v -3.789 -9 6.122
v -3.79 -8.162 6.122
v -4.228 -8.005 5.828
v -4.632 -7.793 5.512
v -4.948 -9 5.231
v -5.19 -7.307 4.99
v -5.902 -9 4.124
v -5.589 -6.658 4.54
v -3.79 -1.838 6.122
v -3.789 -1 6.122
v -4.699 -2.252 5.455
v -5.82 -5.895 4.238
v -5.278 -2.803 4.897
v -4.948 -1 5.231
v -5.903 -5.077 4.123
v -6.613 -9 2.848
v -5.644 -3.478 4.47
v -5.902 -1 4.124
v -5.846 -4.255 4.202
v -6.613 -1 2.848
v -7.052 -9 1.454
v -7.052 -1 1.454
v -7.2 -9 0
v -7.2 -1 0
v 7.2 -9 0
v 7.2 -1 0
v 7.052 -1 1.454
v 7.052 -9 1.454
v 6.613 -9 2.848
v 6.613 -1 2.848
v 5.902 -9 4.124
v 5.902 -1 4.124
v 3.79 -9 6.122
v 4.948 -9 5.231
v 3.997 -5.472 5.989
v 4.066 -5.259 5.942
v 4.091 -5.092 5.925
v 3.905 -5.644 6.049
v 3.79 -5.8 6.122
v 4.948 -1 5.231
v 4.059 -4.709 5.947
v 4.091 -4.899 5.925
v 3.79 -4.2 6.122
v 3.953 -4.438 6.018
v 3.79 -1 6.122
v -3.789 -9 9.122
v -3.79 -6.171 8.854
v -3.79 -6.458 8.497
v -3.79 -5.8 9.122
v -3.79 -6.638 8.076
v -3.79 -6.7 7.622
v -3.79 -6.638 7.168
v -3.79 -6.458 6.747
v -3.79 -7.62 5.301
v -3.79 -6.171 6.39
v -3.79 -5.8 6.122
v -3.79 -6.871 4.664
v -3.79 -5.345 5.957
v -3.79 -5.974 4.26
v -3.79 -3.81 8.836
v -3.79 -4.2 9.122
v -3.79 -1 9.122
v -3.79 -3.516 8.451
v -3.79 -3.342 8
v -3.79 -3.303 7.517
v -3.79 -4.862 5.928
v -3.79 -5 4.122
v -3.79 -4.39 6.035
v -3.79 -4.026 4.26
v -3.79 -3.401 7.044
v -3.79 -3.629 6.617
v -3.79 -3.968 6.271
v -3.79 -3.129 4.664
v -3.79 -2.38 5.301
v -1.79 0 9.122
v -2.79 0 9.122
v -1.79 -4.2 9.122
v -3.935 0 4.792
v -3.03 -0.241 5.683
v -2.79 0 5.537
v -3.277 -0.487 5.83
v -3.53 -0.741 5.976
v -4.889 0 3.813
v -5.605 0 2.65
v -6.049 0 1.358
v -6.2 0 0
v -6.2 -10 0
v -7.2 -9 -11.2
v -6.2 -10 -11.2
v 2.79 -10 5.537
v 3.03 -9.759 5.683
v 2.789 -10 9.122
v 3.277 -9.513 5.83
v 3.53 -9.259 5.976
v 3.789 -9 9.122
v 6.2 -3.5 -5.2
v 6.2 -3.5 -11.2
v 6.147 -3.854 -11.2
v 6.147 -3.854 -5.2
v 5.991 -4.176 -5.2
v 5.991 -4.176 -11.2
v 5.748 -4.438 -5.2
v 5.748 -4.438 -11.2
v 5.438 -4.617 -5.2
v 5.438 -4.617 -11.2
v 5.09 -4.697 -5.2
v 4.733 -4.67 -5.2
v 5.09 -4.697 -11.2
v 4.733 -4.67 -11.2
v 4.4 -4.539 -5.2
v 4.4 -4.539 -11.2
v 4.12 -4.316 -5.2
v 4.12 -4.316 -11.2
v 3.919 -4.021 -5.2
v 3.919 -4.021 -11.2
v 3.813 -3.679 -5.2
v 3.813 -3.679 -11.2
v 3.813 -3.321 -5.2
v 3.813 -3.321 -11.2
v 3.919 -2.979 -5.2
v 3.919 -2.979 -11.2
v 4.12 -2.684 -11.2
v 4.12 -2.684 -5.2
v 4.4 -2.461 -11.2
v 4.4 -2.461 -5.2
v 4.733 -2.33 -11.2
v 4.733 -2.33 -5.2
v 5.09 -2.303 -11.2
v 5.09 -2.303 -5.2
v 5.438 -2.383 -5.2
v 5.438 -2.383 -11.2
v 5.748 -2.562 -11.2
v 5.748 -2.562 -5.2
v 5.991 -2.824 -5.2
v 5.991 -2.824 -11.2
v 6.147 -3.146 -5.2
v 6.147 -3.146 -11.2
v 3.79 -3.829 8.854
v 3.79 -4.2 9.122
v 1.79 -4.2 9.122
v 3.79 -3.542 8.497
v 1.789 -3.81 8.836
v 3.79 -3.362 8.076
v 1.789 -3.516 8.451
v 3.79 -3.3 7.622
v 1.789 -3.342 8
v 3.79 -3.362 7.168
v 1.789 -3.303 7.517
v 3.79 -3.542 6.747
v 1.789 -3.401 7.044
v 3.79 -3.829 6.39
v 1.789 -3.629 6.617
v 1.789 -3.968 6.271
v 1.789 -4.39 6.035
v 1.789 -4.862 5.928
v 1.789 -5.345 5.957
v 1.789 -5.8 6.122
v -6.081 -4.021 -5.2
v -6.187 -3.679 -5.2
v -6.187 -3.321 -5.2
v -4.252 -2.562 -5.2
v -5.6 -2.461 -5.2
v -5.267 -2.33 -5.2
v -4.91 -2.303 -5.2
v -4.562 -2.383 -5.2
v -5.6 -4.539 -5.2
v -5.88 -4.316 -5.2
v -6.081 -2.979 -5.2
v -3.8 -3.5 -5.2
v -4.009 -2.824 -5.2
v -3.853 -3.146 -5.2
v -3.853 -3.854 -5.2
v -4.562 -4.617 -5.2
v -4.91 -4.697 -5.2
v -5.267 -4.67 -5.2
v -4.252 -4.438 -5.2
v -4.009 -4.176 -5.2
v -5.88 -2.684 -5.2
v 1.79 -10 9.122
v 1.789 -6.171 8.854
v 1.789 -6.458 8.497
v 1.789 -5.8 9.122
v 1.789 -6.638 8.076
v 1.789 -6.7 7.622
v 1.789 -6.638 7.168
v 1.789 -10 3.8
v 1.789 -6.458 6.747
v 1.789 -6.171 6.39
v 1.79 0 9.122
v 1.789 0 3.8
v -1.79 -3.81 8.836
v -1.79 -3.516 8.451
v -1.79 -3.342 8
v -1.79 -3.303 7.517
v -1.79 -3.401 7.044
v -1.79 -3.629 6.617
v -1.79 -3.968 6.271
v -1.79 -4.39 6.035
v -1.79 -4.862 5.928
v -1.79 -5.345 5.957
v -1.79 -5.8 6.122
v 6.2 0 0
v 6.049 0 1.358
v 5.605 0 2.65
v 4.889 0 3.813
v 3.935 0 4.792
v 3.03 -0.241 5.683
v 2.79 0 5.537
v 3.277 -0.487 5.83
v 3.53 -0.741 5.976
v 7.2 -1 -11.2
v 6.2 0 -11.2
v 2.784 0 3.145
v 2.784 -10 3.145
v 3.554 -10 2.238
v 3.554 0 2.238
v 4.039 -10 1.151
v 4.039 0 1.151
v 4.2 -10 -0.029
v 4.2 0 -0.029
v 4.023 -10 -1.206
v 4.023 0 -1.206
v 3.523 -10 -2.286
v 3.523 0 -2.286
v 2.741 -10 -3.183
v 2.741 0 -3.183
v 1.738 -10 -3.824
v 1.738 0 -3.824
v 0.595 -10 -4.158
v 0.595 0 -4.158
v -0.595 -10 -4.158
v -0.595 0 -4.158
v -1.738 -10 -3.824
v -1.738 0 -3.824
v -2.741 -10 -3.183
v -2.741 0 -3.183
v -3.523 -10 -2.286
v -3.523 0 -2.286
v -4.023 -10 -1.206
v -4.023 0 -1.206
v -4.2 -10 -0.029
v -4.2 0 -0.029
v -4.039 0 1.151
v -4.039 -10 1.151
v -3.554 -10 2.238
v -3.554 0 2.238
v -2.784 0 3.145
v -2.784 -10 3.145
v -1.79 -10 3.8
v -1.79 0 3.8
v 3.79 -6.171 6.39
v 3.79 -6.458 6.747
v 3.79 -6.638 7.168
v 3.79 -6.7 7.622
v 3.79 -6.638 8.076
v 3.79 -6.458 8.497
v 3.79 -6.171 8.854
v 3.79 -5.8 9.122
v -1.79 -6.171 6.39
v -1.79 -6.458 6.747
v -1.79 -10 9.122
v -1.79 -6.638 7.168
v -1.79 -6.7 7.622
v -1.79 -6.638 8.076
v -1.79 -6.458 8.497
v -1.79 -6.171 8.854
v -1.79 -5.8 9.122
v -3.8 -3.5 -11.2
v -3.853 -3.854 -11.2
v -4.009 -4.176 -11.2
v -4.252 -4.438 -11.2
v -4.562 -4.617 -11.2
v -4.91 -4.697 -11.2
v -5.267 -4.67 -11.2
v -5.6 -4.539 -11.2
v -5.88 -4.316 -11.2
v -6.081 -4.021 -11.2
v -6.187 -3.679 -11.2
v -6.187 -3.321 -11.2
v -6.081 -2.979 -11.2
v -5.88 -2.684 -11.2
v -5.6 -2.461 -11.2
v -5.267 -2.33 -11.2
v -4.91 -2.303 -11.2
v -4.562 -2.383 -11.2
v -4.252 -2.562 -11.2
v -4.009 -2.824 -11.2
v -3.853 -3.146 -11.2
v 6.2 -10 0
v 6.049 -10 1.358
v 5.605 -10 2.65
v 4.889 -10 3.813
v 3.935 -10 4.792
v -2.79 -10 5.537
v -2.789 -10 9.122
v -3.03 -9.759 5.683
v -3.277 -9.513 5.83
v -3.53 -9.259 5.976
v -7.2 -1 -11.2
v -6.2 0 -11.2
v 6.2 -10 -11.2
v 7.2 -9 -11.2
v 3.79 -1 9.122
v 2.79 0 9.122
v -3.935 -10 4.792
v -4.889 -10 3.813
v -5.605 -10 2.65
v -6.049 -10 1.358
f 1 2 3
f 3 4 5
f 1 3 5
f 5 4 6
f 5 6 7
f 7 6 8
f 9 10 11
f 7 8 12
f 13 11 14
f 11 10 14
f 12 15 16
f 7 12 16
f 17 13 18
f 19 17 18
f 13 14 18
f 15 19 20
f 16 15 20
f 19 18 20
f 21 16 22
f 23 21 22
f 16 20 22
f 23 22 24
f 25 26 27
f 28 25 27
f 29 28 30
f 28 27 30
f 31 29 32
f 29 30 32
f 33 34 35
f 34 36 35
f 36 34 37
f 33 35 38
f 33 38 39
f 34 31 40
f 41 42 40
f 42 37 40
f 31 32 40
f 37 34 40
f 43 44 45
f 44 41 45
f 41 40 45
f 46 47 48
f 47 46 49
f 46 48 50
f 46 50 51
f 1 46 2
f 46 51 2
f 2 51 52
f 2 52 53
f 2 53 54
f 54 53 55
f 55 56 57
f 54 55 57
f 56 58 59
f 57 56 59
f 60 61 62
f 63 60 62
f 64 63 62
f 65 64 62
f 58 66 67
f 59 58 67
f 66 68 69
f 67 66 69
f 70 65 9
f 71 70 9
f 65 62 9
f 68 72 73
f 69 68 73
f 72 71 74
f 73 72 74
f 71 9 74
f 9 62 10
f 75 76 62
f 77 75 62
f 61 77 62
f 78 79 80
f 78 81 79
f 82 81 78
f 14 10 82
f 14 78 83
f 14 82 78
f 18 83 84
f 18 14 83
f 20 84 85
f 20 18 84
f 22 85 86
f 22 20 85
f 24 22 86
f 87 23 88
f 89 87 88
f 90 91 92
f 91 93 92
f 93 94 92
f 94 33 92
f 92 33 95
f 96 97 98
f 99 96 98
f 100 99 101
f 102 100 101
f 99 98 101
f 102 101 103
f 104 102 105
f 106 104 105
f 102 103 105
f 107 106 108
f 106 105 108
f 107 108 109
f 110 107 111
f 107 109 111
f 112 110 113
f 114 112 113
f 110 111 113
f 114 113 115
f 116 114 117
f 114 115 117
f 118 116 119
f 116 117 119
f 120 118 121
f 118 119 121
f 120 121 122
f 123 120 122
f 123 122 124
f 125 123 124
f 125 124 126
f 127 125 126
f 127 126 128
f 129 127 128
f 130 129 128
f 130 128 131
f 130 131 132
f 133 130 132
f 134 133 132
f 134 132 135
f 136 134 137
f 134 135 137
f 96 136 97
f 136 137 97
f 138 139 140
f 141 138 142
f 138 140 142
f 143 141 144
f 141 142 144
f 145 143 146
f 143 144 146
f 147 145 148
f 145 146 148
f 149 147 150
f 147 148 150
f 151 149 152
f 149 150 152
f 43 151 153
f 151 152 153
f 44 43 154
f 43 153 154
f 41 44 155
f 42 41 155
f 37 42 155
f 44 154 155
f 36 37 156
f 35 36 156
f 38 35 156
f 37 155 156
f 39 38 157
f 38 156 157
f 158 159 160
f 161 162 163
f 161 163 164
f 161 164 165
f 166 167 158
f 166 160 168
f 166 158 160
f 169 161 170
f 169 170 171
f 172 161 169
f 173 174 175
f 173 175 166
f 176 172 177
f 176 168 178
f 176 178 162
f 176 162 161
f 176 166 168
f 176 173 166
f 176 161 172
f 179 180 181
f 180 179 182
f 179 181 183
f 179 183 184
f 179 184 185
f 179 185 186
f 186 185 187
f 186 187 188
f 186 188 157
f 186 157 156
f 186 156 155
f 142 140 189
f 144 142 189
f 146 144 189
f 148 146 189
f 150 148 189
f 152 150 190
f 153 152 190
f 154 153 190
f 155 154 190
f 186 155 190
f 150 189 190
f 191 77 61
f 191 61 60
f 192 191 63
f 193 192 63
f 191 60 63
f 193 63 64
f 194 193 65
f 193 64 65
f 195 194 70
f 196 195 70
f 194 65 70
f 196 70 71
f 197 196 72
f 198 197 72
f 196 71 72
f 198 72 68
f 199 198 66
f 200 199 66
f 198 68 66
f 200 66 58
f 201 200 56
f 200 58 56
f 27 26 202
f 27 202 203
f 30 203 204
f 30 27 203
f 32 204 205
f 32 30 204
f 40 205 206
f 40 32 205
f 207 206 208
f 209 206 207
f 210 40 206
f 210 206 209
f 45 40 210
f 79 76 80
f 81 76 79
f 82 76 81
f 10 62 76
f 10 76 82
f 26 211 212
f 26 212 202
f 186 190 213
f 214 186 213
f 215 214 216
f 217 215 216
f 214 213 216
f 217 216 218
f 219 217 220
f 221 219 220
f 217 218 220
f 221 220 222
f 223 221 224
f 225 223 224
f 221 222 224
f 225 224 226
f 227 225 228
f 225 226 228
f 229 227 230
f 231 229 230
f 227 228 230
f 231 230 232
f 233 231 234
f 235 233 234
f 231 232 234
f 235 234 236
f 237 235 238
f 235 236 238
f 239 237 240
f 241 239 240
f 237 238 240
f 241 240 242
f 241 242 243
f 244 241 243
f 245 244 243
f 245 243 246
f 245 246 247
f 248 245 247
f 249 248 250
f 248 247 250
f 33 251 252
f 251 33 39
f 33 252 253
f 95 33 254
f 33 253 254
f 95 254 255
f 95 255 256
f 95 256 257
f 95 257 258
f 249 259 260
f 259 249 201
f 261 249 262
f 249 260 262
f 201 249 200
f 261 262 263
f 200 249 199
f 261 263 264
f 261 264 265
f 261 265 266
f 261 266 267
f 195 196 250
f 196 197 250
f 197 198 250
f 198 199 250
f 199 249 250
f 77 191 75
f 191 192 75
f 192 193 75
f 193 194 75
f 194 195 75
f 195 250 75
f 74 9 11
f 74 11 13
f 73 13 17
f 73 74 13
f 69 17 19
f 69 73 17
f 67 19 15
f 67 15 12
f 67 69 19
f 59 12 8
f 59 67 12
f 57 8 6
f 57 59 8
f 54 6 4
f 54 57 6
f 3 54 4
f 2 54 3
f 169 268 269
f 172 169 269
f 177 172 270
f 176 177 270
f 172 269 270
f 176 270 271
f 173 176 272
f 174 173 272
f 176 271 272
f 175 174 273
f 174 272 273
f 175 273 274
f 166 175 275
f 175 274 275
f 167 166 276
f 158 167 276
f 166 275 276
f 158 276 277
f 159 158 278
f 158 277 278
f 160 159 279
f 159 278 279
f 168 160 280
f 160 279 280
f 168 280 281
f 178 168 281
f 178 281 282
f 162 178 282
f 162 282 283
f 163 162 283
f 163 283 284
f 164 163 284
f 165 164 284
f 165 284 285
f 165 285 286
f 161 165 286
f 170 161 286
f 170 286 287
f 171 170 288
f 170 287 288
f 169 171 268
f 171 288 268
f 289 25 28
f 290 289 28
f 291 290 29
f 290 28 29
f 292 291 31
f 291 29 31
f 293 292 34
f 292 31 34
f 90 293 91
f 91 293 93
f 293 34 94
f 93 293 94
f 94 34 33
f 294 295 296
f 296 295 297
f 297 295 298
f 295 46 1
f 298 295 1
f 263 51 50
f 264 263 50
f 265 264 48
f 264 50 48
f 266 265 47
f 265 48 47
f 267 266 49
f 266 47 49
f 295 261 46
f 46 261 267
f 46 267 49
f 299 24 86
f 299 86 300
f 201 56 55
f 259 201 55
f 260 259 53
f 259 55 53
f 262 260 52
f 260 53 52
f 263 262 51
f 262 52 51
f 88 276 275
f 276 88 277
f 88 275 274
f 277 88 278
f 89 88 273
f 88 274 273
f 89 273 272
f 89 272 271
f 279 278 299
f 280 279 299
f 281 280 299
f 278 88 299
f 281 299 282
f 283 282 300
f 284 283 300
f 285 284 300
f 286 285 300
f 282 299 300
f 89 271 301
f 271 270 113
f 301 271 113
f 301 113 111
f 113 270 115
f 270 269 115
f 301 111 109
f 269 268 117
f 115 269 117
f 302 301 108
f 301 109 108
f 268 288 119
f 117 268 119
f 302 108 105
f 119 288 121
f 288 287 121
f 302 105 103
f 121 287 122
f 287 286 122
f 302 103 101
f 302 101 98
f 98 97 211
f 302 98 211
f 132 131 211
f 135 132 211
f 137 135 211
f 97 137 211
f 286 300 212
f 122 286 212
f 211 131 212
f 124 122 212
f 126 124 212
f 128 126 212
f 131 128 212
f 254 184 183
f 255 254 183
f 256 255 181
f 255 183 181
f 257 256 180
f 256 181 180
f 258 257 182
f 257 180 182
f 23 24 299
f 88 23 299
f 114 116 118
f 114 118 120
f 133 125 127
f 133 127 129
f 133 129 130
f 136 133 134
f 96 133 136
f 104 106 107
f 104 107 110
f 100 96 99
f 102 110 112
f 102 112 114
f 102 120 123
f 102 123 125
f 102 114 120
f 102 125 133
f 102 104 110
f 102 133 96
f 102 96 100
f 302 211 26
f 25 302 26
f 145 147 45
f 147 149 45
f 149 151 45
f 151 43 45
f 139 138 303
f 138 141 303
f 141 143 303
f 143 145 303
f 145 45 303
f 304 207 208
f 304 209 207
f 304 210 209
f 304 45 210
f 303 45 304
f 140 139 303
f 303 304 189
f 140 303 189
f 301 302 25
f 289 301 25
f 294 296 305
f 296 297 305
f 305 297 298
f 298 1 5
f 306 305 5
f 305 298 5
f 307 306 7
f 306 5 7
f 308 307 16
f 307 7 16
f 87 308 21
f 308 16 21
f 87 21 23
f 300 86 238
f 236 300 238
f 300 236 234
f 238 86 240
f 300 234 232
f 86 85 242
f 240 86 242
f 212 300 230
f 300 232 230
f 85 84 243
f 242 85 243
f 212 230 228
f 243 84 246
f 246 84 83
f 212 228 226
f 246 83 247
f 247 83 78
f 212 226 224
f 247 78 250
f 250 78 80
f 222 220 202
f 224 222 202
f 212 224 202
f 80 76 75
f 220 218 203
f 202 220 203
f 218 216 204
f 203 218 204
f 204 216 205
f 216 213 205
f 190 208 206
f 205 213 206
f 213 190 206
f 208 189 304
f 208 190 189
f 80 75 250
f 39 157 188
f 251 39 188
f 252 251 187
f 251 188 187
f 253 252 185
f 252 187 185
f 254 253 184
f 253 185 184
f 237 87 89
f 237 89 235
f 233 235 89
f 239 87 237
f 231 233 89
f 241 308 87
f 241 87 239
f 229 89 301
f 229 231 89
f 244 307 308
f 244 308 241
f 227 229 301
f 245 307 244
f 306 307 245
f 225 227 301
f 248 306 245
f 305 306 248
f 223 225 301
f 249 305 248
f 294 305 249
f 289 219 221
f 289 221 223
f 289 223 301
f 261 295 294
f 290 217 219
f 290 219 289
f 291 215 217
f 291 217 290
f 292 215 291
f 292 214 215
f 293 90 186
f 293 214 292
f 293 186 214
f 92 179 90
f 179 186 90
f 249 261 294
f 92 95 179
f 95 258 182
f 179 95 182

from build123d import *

# Parameters (mm, degrees)
F1_DEPTH = 10
F3_DEPTH = 4
F4_DEPTH = 20
F5_R     = 1.2
F6_DEPTH = 6
F7_SIZE  = 1


with BuildPart() as f1:
    # F0 (on Front) → F1 (new body)
    with BuildSketch(Plane.XZ):
        with BuildLine():
            ThreePointArc((1.7895, 3.7996960076), (0, -4.2), (-1.7895, 3.7996960076))
            Line((-1.7895, 3.7996960076), (-1.7895, 6.9740726803))
            Line((-1.7895, 6.9740726803), (-1.7895, 9.1220658074))
            Line((-1.7895, 9.1220658074), (-3.7895, 9.1220658074))
            Line((-3.7895, 9.1220658074), (-3.7895, 6.1220658074))
            ThreePointArc((-3.7895, 6.1220658074), (-6.2898489648, 3.5039691779), (-7.2, 0))
            Line((-7.2, 0), (-7.2, -11.2))
            Line((-7.2, -11.2), (7.2, -11.2))
            Line((7.2, -11.2), (7.2, 0))
            ThreePointArc((7.2, 0), (6.2898489648, 3.5039691779), (3.7895, 6.1220658074))
            Line((3.7895, 6.1220658074), (3.7895, 9.1220658074))
            Line((3.7895, 9.1220658074), (1.7895, 9.1220658074))
            Line((1.7895, 9.1220658074), (1.7895, 6.9740726803))
            Line((1.7895, 6.9740726803), (1.7895, 3.7996960076))
        make_face()
    extrude(amount=F1_DEPTH)

    # F2 (on face) → F3 (cut)
    with BuildSketch(Plane(origin=(-3.7895, 0, 0), x_dir=(0, -1, 0), z_dir=(-1, 0, 0))):
        with BuildLine():
            ThreePointArc((5.8, 9.1220658074), (6.4577379737, 8.4967085916), (6.7, 7.6220658074))
            ThreePointArc((6.7, 7.6220658074), (6.4577379737, 6.7474230232), (5.8, 6.1220658074))
            Line((5.8, 6.1220658074), (8.1622776602, 6.1220658074))
            ThreePointArc((8.1622776602, 6.1220658074), (8.4145257219, 6.8532913966), (8.5, 7.6220658074))
            ThreePointArc((8.5, 7.6220658074), (8.4145257219, 8.3908402182), (8.1622776602, 9.1220658074))
            Line((8.1622776602, 9.1220658074), (5.8, 9.1220658074))
        make_face()
        with BuildLine():
            ThreePointArc((4.2, 9.1220658074), (5, 9.3220658074), (5.8, 9.1220658074))
            Line((5.8, 9.1220658074), (8.1622776602, 9.1220658074))
            ThreePointArc((8.1622776602, 9.1220658074), (5, 11.1220658074), (1.8377223398, 9.1220658074))
            Line((1.8377223398, 9.1220658074), (4.2, 9.1220658074))
        make_face()
        with BuildLine():
            Line((8.1622776602, 6.1220658074), (5.8, 6.1220658074))
            ThreePointArc((5.8, 6.1220658074), (5, 5.9220658074), (4.2, 6.1220658074))
            Line((4.2, 6.1220658074), (1.8377223398, 6.1220658074))
            ThreePointArc((1.8377223398, 6.1220658074), (5, 4.1220658074), (8.1622776602, 6.1220658074))
        make_face()
        with BuildLine():
            ThreePointArc((4.2, 6.1220658074), (3.3, 7.6220658074), (4.2, 9.1220658074))
            Line((4.2, 9.1220658074), (1.8377223398, 9.1220658074))
            ThreePointArc((1.8377223398, 9.1220658074), (1.5, 7.6220658074), (1.8377223398, 6.1220658074))
            Line((1.8377223398, 6.1220658074), (4.2, 6.1220658074))
        make_face()
    extrude(amount=F3_DEPTH, mode=Mode.SUBTRACT)

    # F2 (on face) → F4 (cut, symmetric)
    with BuildSketch(Plane(origin=(-3.7895, 0, 0), x_dir=(0, -1, 0), z_dir=(-1, 0, 0))):
        with BuildLine():
            Line((4.2, 9.1220658074), (5.8, 9.1220658074))
            ThreePointArc((5.8, 9.1220658074), (5, 9.3220658074), (4.2, 9.1220658074))
        make_face()
        with BuildLine():
            ThreePointArc((5.8, 6.1220658074), (6.4577379737, 6.7474230232), (6.7, 7.6220658074))
            ThreePointArc((6.7, 7.6220658074), (6.4577379737, 8.4967085916), (5.8, 9.1220658074))
            Line((5.8, 9.1220658074), (4.2, 9.1220658074))
            ThreePointArc((4.2, 9.1220658074), (3.3, 7.6220658074), (4.2, 6.1220658074))
            Line((4.2, 6.1220658074), (5.8, 6.1220658074))
        make_face()
        with BuildLine():
            ThreePointArc((4.2, 6.1220658074), (5, 5.9220658074), (5.8, 6.1220658074))
            Line((5.8, 6.1220658074), (4.2, 6.1220658074))
        make_face()
    extrude(amount=F4_DEPTH, both=True, mode=Mode.SUBTRACT)

    # F5 (on face) → F6 (cut)
    with BuildSketch(Plane(origin=(0, 0, -11.2), x_dir=(1, 0, 0), z_dir=(0, 0, -1))):
        with Locations((-5, 3.5)):
            Circle(F5_R)
        with Locations((5, 3.5)):
            Circle(F5_R)
    extrude(amount=-F6_DEPTH, mode=Mode.SUBTRACT)

    # F7
    f7_edges = [f1.edges().sort_by_distance(p)[0] for p in [
        (7.2, 0, -5.6),
        (7.2, -10, -5.6),
        (-7.2, -10, -5.6),
        (-7.2, 0, -5.6),
        (3.7895, -10, 7.622066),
        (3.7895, 0, 7.622066),
        (-3.7895, -10, 7.622066),
        (-3.7895, 0, 7.622066),
        (-6.289849, 0, 3.503969),
        (6.289849, 0, 3.503969),
        (-6.289849, -10, 3.503969),
        (6.289849, -10, 3.503969),
    ]]
    chamfer(f7_edges, length=F7_SIZE)


solid = f1.part
